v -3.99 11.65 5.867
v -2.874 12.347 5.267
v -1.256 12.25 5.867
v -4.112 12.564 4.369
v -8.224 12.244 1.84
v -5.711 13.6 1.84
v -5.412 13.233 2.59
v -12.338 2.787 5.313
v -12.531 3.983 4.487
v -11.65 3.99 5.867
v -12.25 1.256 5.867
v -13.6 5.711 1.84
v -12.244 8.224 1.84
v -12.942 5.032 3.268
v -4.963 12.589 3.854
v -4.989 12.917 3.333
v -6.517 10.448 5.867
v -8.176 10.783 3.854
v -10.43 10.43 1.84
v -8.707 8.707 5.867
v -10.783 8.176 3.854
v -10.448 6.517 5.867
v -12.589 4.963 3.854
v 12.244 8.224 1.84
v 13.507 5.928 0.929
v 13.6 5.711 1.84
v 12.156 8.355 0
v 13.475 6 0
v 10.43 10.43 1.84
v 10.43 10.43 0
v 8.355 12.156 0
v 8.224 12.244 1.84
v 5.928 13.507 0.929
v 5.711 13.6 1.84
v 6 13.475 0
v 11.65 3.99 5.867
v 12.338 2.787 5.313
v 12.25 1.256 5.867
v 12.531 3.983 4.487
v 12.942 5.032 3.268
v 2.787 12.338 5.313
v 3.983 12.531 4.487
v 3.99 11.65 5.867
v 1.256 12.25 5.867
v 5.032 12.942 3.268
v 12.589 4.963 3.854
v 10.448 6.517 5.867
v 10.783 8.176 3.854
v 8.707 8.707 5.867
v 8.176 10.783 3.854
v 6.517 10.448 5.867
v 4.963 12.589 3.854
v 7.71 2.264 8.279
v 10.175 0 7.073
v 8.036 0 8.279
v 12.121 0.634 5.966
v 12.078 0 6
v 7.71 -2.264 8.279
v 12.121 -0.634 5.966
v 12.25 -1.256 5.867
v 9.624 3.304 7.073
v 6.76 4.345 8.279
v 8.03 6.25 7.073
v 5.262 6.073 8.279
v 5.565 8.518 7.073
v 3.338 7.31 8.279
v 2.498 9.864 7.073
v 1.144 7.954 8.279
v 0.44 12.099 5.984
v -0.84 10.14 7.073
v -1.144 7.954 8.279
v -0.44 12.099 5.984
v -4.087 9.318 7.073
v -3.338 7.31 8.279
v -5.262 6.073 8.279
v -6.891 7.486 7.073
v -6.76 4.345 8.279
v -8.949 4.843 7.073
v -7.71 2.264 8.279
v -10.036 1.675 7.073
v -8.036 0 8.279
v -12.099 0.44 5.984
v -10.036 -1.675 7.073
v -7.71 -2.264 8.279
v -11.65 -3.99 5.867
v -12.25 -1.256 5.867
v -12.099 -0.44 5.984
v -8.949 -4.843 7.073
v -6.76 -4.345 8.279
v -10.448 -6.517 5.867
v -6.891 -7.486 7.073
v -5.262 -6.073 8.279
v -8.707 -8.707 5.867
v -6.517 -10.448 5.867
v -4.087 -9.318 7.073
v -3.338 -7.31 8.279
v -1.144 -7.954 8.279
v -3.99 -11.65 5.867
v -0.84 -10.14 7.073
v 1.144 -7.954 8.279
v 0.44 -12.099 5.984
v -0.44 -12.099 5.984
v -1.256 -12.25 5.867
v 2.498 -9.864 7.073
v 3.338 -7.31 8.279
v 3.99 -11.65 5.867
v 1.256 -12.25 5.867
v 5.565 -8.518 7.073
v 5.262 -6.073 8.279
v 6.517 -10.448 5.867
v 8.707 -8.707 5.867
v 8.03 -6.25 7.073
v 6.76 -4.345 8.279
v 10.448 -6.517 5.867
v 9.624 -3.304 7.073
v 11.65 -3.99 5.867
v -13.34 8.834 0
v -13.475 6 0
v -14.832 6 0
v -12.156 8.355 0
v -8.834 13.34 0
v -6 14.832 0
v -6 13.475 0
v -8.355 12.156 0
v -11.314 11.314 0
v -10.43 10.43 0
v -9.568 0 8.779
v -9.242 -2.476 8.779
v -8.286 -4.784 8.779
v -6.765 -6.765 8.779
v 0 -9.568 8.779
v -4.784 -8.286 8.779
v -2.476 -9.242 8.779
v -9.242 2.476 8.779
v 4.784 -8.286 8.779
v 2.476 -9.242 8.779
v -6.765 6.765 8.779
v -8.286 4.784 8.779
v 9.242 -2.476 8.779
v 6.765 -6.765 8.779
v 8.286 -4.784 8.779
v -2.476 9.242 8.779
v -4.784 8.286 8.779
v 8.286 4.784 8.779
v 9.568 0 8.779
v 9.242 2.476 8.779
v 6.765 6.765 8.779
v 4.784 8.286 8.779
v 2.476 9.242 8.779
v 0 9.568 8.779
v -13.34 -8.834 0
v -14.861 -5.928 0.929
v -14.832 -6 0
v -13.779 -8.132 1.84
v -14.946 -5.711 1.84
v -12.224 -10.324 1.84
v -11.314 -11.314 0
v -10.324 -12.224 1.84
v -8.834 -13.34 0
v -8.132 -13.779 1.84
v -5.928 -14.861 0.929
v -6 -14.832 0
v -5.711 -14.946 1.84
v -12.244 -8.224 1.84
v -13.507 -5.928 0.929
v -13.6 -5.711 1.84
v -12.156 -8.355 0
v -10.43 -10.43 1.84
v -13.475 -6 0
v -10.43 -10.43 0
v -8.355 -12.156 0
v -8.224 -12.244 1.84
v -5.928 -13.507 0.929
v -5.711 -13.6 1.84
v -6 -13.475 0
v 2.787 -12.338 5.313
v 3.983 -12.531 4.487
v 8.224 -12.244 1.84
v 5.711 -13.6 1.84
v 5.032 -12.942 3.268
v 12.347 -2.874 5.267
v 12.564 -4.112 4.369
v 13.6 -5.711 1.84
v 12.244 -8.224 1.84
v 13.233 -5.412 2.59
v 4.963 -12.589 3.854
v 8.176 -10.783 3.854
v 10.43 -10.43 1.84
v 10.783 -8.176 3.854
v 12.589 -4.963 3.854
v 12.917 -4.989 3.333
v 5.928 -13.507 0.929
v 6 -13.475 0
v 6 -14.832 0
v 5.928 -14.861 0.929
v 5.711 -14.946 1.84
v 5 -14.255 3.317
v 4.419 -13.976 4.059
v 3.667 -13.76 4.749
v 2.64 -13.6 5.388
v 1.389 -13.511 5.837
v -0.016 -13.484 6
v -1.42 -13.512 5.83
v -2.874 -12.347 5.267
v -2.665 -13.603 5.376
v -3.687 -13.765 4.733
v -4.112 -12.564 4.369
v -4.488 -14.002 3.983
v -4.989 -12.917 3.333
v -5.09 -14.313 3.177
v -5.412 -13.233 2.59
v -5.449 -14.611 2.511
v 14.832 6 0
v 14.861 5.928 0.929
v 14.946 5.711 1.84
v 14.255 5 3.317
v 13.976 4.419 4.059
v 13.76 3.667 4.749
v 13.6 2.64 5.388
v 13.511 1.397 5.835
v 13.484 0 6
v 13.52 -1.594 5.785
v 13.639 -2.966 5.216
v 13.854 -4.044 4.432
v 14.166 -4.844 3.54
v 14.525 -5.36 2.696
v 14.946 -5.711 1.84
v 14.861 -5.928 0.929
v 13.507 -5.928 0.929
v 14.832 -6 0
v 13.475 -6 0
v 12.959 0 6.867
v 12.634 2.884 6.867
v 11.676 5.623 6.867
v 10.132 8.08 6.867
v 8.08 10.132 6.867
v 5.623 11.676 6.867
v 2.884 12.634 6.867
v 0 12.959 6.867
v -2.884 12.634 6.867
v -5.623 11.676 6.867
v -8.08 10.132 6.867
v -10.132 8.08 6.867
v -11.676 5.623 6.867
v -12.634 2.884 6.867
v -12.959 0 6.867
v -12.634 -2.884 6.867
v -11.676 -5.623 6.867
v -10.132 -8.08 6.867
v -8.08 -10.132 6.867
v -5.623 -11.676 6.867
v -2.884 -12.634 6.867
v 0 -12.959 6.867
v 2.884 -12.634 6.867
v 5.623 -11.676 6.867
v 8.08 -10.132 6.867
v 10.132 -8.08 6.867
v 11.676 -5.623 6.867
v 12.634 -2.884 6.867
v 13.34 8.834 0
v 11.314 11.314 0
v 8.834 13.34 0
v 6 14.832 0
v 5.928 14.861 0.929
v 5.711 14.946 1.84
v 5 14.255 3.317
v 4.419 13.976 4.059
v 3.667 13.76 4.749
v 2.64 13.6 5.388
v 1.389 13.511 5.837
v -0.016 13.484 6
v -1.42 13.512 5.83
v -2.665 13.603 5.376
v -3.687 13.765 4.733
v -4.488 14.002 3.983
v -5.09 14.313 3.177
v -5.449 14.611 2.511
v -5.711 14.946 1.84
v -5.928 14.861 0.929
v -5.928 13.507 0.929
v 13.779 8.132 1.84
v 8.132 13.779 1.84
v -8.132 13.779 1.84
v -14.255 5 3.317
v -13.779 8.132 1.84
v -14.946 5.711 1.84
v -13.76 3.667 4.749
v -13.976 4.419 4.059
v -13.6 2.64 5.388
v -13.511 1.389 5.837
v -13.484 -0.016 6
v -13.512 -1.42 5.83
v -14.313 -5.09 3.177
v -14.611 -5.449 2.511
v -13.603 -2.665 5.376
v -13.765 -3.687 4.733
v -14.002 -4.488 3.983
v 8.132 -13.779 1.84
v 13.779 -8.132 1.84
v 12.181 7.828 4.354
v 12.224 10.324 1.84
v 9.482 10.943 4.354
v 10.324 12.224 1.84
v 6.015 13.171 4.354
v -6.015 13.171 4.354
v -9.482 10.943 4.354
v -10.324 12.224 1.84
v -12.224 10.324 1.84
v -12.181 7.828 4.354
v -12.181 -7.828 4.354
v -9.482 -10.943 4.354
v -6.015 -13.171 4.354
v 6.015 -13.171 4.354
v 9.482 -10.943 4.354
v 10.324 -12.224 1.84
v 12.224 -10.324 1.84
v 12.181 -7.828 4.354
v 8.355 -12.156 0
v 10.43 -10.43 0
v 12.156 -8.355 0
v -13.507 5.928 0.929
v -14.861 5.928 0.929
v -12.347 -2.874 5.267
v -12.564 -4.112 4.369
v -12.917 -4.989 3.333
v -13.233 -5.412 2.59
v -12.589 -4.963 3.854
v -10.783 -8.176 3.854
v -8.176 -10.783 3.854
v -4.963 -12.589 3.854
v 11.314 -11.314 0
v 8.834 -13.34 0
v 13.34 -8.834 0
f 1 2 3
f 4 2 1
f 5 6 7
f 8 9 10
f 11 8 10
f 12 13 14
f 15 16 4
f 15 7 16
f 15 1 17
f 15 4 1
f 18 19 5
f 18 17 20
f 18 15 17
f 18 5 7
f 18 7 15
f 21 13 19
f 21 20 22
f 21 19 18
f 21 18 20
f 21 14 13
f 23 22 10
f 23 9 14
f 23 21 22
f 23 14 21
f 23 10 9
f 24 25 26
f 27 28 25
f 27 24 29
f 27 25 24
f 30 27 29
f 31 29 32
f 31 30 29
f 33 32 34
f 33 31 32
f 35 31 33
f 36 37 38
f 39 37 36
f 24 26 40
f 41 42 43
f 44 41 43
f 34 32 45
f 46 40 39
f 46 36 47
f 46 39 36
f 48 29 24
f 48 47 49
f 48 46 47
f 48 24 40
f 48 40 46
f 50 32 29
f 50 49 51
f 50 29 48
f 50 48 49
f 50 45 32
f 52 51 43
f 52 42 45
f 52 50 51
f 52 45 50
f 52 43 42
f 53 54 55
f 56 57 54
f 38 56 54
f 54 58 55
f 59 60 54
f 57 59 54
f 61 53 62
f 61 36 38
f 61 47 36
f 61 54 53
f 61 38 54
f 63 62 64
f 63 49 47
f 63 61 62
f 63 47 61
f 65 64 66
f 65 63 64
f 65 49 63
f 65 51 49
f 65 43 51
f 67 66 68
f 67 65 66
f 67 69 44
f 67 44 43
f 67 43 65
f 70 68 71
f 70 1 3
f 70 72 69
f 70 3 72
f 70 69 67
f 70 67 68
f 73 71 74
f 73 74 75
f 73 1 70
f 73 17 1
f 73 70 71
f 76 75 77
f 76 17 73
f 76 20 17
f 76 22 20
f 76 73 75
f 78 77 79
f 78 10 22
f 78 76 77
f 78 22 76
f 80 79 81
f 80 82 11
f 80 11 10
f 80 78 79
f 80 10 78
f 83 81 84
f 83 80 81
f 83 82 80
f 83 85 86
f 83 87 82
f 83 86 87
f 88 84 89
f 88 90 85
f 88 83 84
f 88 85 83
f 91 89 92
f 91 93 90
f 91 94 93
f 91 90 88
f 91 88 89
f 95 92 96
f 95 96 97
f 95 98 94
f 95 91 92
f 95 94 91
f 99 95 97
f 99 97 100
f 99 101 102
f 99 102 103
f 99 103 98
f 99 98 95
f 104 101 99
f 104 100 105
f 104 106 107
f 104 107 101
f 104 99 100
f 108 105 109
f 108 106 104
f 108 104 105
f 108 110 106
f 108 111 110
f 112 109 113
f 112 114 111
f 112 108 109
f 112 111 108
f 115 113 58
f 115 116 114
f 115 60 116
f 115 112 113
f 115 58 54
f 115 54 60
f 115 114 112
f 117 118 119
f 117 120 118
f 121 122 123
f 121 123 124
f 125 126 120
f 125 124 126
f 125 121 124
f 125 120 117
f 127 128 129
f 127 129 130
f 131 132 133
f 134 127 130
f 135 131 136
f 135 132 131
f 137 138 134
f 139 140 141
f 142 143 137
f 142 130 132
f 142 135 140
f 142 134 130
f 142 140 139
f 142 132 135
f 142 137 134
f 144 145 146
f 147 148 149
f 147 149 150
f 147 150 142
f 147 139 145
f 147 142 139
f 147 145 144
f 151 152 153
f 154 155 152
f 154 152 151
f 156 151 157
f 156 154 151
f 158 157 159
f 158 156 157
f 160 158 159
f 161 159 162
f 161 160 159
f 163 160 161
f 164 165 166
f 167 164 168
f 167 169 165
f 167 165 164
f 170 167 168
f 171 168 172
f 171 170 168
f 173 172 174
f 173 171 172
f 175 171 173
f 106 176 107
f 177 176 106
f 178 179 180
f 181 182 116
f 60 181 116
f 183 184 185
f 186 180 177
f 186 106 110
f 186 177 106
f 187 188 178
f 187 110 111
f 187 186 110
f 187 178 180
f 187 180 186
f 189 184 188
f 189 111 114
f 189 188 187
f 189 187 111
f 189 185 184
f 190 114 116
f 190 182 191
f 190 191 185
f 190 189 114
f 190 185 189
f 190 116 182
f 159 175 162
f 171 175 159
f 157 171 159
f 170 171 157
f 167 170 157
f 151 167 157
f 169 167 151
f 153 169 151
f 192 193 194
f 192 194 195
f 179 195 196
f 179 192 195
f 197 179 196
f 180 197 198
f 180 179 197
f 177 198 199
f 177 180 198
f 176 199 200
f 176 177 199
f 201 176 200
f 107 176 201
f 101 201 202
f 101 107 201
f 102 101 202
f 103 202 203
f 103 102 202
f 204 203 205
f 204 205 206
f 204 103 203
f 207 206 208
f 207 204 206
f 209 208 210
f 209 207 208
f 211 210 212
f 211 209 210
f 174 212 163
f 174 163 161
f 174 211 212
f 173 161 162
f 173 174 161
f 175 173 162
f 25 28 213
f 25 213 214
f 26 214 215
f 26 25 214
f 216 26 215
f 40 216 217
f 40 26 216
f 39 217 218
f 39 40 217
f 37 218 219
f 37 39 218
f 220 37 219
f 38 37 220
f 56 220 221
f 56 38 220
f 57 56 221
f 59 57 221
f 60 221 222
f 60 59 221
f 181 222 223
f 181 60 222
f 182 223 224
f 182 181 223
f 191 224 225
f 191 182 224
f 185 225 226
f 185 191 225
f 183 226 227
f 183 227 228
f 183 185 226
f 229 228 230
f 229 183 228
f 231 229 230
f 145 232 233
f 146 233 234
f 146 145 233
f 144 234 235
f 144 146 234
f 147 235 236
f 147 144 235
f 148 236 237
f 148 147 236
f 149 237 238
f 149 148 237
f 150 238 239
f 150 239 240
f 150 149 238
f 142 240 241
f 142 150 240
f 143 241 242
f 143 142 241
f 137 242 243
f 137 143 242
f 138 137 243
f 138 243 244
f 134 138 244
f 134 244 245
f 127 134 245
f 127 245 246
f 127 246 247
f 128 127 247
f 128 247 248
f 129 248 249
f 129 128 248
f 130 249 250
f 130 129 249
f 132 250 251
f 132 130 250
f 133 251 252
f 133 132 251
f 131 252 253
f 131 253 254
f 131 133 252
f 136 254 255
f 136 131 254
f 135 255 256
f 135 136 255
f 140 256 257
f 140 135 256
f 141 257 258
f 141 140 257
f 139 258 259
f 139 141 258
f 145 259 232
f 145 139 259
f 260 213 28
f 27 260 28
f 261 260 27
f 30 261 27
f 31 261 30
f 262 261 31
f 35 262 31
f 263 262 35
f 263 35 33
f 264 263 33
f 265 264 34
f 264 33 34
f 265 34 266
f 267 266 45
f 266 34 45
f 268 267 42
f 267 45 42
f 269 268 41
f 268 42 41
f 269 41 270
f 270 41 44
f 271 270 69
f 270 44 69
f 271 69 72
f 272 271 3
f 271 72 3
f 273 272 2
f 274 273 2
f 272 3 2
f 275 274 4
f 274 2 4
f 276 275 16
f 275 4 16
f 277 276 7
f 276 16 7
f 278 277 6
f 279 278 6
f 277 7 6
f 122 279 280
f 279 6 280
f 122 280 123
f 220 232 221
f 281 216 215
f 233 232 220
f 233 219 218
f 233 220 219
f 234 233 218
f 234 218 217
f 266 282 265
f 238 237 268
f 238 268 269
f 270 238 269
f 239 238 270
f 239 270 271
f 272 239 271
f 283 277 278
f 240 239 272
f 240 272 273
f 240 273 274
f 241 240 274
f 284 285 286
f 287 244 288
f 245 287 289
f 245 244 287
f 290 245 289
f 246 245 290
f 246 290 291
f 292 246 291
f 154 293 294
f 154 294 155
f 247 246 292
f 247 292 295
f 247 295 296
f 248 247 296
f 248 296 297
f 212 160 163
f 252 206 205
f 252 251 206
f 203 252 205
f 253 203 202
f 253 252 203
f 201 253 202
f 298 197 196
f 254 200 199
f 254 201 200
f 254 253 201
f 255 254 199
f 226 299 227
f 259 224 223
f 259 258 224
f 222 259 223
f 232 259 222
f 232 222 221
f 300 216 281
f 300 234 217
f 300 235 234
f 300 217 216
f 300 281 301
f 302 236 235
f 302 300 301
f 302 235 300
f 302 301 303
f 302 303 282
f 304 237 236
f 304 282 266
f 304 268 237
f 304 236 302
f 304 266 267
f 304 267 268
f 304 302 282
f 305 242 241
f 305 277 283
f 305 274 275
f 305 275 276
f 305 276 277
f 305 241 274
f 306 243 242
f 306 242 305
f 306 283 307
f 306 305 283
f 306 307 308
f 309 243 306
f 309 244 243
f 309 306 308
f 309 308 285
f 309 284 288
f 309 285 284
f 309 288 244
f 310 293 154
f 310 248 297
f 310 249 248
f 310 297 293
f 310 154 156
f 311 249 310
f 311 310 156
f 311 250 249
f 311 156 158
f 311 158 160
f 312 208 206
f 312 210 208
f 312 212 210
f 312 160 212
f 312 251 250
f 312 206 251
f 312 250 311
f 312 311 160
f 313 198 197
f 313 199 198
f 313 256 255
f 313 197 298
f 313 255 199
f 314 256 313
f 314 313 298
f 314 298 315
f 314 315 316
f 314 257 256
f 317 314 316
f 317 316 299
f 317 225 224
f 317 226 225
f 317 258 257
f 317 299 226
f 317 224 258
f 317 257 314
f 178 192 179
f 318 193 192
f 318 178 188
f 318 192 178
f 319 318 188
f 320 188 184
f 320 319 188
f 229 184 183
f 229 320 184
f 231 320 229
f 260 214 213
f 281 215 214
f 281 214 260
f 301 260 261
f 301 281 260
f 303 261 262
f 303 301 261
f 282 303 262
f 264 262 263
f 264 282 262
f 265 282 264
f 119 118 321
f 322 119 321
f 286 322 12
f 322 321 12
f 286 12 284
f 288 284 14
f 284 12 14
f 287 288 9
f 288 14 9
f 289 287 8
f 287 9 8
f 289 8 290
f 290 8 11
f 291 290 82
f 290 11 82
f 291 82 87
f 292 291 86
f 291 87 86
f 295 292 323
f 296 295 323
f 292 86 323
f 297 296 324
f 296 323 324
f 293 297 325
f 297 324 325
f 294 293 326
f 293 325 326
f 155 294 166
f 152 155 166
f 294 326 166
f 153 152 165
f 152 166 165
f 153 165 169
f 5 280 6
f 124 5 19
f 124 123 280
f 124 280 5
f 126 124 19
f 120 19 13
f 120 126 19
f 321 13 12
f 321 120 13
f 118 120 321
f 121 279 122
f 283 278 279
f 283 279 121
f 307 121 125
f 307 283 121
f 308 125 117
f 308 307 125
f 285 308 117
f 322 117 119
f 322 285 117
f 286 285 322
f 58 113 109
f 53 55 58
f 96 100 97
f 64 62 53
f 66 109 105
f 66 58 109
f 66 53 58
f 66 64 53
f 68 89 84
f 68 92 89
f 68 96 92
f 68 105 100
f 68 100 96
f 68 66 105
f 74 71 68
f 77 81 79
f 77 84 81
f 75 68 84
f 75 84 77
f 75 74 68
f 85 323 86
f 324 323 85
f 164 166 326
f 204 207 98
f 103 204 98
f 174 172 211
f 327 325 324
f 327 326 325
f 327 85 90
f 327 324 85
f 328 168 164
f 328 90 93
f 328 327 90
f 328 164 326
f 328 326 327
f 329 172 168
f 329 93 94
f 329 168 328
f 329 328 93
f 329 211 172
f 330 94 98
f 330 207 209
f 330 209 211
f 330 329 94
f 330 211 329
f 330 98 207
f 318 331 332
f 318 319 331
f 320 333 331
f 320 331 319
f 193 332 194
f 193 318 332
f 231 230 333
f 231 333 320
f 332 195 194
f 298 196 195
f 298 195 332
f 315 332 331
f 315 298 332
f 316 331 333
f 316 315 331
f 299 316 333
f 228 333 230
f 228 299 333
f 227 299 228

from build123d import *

# Parameters (mm, degrees)
F2_R          = 6
F3_DEPTH      = 25
F3_DEPTH_BACK = 25
F4_R          = 6
F5_DEPTH      = 25
F5_DEPTH_BACK = 25


with BuildPart() as f1:
    # F0 (on Front) → F1 (revolve)
    with BuildSketch(Plane.XZ):
        Polygon((14.75, 1.8402526621), (14.75, 0), (16, 0), (16, 1.8402526621), (12.959116371, 6.8669730598), (9.5678537413, 8.778959482), (0, 8.778959482), (0, 8.278959482), (8.0359548395, 8.278959482), (12.3140602287, 5.8669730598), align=None)
    revolve(axis=Axis((0, 0, 4.778959482), (0, 0, 1)))

    # F2 (on Front) → F3 (cut, two sides)
    with BuildSketch(Plane.XZ) as f3_sk:
        Circle(F2_R)
    extrude(amount=-F3_DEPTH, mode=Mode.SUBTRACT)
    extrude(f3_sk.sketch, amount=F3_DEPTH_BACK, mode=Mode.SUBTRACT)

    # F4 (on Right) → F5 (cut, two sides)
    with BuildSketch(Plane.YZ) as f5_sk:
        Circle(F4_R)
    extrude(amount=-F5_DEPTH, mode=Mode.SUBTRACT)
    extrude(f5_sk.sketch, amount=F5_DEPTH_BACK, mode=Mode.SUBTRACT)


solid = f1.part
